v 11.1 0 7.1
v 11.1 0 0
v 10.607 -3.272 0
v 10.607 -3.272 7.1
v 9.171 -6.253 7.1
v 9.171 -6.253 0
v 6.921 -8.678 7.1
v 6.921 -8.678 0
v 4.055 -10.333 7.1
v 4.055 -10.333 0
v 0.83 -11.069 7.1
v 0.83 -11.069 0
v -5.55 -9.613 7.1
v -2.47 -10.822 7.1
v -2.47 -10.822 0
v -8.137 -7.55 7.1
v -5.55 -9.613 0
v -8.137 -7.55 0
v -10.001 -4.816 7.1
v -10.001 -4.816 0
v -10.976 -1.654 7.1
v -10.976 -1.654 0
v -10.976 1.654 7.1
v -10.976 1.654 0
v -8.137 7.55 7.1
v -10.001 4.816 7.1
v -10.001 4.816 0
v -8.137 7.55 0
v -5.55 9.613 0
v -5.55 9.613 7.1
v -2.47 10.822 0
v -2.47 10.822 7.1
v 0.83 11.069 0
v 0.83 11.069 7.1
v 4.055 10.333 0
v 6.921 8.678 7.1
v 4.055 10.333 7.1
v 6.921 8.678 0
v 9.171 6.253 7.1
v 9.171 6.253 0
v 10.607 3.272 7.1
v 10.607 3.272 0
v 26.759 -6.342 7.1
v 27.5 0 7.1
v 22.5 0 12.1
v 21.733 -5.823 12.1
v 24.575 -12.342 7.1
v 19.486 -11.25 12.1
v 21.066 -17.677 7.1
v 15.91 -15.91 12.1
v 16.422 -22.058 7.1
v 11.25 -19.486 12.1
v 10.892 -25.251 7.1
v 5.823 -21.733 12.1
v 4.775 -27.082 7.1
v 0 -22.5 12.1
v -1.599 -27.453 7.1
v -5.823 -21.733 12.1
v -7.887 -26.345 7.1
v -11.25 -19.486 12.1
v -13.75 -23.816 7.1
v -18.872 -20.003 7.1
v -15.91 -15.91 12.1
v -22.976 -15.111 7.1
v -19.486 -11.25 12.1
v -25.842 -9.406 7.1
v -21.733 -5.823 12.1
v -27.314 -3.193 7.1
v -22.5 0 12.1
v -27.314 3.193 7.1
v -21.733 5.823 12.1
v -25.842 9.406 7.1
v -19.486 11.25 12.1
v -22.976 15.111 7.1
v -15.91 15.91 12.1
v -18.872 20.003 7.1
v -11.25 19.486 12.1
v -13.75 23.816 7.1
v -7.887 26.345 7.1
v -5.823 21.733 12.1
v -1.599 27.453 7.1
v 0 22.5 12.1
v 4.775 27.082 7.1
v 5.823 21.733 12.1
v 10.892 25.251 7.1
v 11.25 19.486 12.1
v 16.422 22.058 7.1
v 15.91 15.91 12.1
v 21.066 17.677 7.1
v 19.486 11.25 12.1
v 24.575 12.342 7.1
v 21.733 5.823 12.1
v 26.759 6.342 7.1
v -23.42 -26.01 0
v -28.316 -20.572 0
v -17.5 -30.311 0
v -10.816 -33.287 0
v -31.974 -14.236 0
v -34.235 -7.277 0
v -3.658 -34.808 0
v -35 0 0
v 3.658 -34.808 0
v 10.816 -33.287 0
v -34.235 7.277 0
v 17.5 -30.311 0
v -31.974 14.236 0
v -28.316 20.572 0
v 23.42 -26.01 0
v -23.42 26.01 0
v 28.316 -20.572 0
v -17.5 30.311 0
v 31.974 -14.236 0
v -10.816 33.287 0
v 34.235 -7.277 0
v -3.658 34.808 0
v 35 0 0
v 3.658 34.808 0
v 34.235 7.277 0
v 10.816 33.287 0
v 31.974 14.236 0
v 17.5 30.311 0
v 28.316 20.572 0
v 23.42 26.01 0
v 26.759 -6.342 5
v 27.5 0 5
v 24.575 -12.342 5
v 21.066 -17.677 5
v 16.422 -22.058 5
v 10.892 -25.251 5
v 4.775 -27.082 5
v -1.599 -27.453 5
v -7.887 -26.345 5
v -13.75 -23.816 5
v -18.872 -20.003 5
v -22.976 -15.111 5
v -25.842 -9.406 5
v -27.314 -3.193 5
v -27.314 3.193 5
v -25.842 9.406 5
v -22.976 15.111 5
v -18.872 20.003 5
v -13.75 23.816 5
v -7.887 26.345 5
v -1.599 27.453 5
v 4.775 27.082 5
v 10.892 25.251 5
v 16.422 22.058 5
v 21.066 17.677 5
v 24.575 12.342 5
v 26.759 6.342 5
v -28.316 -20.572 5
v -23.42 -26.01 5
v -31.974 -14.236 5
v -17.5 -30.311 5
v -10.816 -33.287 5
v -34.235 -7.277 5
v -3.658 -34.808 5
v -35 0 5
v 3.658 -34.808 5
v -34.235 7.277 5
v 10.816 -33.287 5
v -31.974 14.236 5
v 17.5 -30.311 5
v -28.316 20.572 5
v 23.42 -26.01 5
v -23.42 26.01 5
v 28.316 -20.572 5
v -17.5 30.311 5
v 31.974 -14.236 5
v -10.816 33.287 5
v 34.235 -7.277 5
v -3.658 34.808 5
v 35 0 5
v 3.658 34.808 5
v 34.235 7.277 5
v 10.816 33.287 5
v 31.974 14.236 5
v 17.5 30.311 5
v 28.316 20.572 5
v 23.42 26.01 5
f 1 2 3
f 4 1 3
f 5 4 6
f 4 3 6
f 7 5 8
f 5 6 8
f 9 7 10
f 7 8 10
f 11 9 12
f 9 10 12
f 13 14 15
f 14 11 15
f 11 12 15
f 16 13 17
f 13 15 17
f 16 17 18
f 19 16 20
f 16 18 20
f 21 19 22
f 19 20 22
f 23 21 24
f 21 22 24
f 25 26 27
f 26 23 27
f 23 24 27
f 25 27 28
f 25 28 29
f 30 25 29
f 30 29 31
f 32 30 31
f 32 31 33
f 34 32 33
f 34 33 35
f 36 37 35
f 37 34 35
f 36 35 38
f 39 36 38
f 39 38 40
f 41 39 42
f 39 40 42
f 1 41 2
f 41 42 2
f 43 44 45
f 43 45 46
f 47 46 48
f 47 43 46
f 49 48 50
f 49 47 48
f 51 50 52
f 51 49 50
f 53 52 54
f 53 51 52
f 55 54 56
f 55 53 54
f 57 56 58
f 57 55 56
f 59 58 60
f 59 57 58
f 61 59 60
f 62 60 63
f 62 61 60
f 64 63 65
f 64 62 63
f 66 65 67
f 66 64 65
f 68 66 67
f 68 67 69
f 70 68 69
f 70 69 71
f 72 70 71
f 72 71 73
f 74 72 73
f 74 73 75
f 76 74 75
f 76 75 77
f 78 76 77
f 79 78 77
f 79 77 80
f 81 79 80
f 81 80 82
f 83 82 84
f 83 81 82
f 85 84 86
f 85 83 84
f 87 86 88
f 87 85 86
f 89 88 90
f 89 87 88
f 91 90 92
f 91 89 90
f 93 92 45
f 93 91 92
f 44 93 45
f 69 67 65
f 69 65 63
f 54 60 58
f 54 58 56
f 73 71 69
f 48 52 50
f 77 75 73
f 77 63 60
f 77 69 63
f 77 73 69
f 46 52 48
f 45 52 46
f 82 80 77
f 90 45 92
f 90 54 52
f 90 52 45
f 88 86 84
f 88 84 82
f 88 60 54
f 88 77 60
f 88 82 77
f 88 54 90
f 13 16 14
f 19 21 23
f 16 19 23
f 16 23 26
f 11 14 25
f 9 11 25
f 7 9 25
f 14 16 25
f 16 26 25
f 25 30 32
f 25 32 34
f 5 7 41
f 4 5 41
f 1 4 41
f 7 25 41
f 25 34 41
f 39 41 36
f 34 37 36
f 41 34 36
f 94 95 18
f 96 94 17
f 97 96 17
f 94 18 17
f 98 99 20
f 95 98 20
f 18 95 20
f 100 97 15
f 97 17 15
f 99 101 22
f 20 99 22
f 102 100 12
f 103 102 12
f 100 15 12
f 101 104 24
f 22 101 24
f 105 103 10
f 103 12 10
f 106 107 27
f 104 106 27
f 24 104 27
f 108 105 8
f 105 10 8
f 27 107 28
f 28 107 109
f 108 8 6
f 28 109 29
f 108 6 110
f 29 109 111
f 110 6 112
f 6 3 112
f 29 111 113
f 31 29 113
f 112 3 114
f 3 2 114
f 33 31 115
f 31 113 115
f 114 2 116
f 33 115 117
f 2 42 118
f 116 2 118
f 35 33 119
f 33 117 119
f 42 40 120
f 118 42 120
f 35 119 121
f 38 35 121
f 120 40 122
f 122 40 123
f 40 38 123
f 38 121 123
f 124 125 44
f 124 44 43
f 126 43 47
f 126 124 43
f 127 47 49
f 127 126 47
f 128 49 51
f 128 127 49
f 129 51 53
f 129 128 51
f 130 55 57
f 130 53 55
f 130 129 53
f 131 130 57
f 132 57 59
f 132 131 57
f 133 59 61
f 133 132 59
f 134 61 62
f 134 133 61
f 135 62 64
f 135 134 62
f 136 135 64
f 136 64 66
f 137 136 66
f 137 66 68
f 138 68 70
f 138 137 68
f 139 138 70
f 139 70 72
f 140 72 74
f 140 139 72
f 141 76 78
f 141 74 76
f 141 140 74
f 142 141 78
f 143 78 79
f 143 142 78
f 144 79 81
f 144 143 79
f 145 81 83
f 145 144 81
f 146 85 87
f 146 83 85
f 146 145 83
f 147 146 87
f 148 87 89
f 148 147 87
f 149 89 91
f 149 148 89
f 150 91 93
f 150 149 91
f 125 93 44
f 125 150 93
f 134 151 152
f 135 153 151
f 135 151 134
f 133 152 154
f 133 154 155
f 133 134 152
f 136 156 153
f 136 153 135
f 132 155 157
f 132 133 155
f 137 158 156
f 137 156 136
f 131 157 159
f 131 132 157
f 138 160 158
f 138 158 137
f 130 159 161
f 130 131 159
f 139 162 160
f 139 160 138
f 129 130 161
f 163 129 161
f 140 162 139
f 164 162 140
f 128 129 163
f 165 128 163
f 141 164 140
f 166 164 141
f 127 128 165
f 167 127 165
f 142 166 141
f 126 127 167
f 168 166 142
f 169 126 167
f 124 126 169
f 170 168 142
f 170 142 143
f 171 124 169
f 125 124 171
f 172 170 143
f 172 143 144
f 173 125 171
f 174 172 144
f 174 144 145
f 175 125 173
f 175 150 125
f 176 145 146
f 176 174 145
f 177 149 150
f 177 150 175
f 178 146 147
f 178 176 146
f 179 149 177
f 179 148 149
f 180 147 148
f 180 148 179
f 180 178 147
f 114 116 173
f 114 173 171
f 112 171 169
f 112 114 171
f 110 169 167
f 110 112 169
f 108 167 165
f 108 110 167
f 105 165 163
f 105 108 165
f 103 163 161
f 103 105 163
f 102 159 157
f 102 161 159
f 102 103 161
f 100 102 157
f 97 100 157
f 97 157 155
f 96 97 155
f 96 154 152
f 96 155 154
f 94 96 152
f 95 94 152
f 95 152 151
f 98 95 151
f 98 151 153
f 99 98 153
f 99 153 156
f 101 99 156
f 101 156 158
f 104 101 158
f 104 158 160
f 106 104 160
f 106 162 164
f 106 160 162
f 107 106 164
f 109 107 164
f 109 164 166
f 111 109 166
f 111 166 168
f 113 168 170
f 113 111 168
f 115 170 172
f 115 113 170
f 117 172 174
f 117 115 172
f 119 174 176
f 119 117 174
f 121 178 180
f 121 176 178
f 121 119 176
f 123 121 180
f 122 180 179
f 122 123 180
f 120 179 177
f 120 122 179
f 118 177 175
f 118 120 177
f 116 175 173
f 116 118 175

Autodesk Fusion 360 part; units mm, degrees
sketch "Sketch1" plane through (0, 0, 0) normal (0, 0, 1) x (1, 0, 0)
  circle A0 centre (0, 0) radius 27.5
  circle A1 centre (0, 0) radius 35
  circle A2 centre (0, 0) radius 11.1
  circle A3 centre (0, 0) radius 8.6
  dimension "d1" = 55
  dimension "d2" = 70
  dimension "d3" = 22.2
  dimension "d4" = 17.2
extrude "Extrude1" add sketch "Sketch1" along normal blind 7.1 contours A2
extrude "Extrude2" add sketch "Sketch1" along normal blind 5 from surface at 7.1 contours A2 | A3
extrude "Extrude3" add sketch "Sketch1" along normal blind 5 contours A0 | A1
extrude "Extrude4" add sketch "Sketch1" along normal blind 12.1 contours A0
chamfer "Chamfer1" distance 5 angle 45 1 edges at (-25.639, -9.9444, 12.1)
extrude "Extrude5" cut sketch "Sketch1" along normal blind 7.1 contours A2
equation "d1 = SpoolHoleID"
equation "d2 = SpoolShelfOD"
equation "d3 = BearingOD"
equation "d4 = BearingOD - bearingHolderWallThickness"
equation "BearingOD = 22.20 mm"
equation "bearingHolderWallThickness = 5 mm"
equation "SpoolHoleID = 55 mm"
equation "SpoolShelfOD = 70 mm"
equation "SpoolShelfThickness = 5 mm"
equation "SpoolInsertHeight = 5 mm"
equation "SpoolInsertChamfer = 5 mm"
equation "BearingHeight = 7.10 mm"
equation "d13 = BearingHeight"
equation "d15 = BearingHeight"
equation "d16 = SpoolShelfThickness"
equation "d18 = SpoolShelfThickness"
equation "d20 = SpoolShelfThickness + BearingHeight"
equation "d22 = SpoolInsertChamfer"
equation "d23 = BearingHeight"
